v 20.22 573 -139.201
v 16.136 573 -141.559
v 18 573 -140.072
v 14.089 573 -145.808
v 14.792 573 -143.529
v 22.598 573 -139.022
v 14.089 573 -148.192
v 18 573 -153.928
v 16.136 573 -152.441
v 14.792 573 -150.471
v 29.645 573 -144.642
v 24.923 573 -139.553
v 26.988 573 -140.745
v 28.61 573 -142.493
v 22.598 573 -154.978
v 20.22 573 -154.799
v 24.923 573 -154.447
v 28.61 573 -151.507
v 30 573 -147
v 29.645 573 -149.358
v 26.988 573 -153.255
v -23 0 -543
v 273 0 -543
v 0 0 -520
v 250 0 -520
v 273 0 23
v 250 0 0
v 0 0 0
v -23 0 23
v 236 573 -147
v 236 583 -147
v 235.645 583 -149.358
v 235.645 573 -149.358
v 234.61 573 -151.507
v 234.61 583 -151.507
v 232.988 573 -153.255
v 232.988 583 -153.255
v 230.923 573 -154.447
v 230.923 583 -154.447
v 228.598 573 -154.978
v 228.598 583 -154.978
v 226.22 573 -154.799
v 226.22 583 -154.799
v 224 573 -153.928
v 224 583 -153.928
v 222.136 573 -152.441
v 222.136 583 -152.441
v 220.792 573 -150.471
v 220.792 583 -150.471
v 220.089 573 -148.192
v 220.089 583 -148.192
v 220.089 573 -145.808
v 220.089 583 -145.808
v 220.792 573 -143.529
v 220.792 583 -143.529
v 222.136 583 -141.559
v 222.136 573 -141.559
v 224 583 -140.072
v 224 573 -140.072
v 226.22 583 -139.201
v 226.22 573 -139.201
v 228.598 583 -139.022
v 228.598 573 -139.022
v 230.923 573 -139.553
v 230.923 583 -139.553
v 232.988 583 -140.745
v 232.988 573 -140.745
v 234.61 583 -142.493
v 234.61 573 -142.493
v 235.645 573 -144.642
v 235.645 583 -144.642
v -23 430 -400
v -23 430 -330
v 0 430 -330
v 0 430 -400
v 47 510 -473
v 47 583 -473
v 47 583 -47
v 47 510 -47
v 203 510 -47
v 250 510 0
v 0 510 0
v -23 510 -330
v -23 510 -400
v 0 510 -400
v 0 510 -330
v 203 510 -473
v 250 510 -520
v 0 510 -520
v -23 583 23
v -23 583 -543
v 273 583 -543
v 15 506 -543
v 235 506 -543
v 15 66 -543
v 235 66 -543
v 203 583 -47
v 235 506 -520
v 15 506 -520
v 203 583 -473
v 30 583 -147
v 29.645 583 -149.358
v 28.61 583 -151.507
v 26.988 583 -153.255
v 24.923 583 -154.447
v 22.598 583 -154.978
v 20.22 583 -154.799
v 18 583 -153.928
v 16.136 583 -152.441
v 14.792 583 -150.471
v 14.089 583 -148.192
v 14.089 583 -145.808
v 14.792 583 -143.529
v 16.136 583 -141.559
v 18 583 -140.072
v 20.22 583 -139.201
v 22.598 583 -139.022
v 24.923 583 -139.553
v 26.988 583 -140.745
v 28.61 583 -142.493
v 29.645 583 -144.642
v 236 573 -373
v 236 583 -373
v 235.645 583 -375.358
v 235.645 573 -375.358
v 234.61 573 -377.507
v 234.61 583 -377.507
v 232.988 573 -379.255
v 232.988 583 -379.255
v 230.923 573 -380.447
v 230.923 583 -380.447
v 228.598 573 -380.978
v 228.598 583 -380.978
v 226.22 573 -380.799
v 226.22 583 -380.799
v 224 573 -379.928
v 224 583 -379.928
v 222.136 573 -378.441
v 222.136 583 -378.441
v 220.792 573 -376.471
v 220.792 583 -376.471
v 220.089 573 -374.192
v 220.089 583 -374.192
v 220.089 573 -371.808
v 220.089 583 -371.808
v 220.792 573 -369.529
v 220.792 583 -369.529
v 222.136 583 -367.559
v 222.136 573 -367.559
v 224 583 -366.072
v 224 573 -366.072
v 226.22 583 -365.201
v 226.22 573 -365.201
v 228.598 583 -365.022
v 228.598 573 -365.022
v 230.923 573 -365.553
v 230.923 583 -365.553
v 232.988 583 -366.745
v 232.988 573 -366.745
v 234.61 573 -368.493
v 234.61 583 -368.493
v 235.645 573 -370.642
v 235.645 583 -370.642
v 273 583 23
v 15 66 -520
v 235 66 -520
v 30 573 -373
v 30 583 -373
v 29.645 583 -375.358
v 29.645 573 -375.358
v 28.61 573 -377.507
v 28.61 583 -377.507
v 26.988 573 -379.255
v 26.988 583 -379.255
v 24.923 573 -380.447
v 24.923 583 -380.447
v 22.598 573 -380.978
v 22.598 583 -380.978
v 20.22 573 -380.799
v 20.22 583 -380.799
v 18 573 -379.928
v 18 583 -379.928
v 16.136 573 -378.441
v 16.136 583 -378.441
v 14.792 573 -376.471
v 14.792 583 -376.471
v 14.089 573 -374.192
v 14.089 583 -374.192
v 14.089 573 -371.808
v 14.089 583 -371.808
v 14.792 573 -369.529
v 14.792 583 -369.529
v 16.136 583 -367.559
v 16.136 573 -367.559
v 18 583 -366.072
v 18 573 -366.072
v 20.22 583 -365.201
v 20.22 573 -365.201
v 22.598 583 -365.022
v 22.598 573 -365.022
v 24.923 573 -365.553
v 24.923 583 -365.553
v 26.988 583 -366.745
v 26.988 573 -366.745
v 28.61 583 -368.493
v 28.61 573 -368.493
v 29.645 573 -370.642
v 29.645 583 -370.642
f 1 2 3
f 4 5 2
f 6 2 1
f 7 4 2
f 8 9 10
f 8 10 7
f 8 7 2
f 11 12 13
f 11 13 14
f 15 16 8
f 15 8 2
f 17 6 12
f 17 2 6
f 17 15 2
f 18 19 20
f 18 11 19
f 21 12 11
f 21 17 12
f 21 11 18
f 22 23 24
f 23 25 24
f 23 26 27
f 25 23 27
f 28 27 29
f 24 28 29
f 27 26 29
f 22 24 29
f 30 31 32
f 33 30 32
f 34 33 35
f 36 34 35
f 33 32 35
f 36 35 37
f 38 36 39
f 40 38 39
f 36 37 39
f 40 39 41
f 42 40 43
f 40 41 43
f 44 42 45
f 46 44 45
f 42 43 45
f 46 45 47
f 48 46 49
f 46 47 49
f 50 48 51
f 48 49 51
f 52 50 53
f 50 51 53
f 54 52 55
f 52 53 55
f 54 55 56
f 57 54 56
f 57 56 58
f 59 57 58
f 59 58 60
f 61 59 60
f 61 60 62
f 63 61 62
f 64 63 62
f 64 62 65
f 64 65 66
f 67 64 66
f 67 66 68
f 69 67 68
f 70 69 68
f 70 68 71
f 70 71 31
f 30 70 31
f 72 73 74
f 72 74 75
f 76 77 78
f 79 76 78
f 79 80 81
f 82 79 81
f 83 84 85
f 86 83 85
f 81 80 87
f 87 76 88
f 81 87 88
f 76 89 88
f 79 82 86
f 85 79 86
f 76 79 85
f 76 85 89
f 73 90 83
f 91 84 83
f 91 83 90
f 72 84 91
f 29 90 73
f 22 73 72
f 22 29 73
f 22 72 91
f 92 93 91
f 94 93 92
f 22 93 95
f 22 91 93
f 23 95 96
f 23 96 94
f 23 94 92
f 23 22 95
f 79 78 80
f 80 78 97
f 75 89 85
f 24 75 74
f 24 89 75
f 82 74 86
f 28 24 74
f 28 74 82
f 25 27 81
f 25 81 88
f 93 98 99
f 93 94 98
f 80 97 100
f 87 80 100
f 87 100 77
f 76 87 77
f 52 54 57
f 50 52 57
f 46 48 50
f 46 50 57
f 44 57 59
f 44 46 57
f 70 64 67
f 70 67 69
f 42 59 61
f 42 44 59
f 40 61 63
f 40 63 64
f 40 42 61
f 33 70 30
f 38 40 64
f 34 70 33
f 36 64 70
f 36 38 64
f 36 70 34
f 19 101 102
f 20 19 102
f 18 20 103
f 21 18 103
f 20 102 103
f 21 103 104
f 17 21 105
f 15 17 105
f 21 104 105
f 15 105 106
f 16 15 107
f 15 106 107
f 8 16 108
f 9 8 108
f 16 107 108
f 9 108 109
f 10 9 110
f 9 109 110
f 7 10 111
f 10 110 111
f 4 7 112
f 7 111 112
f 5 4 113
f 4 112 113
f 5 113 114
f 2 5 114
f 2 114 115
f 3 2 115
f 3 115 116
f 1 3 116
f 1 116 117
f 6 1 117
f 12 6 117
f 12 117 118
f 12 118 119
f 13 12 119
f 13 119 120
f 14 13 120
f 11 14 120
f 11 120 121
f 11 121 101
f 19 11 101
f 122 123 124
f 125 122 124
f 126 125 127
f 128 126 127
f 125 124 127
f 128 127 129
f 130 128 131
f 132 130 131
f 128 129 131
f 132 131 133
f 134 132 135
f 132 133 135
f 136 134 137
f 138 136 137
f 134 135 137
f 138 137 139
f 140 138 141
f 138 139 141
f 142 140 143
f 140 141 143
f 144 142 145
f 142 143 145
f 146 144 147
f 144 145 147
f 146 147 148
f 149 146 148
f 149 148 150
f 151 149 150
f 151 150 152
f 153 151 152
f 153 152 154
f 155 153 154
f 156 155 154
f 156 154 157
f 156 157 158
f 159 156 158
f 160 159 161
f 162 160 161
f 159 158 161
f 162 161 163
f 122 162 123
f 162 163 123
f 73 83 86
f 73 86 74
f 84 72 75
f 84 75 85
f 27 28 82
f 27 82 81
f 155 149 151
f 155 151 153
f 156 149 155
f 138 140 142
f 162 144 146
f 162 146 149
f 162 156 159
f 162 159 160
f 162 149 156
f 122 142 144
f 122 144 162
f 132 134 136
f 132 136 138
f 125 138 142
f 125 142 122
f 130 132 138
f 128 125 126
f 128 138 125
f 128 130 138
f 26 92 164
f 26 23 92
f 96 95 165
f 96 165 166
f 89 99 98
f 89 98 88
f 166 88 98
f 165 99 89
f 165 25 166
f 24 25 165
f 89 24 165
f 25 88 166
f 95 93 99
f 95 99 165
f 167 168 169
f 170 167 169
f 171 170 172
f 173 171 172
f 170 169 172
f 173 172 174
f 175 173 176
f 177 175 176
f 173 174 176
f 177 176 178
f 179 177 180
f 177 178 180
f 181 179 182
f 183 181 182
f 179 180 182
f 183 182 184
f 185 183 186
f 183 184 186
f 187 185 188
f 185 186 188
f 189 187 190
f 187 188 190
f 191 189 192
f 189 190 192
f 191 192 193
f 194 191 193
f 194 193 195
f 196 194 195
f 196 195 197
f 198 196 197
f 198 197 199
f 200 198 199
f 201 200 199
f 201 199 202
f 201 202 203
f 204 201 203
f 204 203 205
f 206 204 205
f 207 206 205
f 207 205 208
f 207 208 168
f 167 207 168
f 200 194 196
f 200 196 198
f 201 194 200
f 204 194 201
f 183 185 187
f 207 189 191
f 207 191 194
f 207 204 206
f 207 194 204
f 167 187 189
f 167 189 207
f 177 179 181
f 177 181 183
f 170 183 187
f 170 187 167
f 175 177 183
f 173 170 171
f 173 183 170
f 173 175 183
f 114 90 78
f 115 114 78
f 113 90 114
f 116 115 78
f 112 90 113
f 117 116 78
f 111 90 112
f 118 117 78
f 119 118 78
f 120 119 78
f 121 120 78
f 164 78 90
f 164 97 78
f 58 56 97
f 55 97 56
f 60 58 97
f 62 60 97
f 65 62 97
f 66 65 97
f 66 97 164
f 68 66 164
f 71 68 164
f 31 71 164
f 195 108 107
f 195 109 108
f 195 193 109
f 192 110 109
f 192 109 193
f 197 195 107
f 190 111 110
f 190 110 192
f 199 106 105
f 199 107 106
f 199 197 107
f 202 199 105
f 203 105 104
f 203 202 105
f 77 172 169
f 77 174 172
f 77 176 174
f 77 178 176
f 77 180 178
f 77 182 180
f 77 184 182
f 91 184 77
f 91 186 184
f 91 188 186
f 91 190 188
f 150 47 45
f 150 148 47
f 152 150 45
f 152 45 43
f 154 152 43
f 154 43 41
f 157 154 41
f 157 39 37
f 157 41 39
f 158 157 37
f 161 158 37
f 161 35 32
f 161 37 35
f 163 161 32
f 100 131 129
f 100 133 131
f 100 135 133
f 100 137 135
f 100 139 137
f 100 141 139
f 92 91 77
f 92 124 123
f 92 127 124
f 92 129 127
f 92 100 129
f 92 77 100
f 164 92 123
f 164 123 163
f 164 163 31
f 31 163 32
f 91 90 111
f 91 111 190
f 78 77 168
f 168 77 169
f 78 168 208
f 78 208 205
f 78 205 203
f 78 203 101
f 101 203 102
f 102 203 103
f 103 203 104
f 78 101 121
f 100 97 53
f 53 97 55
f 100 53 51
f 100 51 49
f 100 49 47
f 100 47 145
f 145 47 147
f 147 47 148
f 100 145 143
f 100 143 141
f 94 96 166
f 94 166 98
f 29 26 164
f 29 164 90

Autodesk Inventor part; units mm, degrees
ref_plane "YZ Plane" through (0, 0, 0) normal (1, 0, 0) x (0, 1, 0)
ref_plane "XZ Plane" through (0, 0, 0) normal (0, 1, 0) x (-1, 0, 0)
ref_plane "XY Plane" through (0, 0, 0) normal (0, 0, 1) x (1, 0, 0)
sketch "Sketch1" plane through (0, 0, 0) normal (0, 1, 0) x (-1, 0, 0)
  line L0 (0, 0) -> (-250, 0)
  line L1 (-250, 0) -> (-250, -520)
  line L2 (-250, -520) -> (0, -520)
  line L3 (0, -520) -> (0, 0)
  line L4 (23, -543) -> (-273, -543)
  line L5 (-273, -543) -> (-273, 23)
  line L6 (-273, 23) -> (23, 23)
  line L7 (23, 23) -> (23, -543)
  dimension "d0" = 250
  dimension "d1" = 520
  dimension "d2" = 23
extrude "Extrusion1" add sketch "Sketch1" along normal blind 583
sketch "Sketch2" plane through (273, 0, -543) normal (0, 0, -1) x (-1, 0, 0)
  line L0 (38, 506) -> (258, 506)
  line L1 (258, 506) -> (258, 66)
  line L2 (258, 66) -> (38, 66)
  line L3 (38, 66) -> (38, 506)
  line L4 (0, 583) -> (296, 583) projected
  line L5 (296, 0) -> (296, 583) projected
  point P0 (273, 0)
  dimension "d5" = 220
  dimension "d6" = 440
  dimension "d7" = 77
  dimension "d8" = 38
extrude "Extrusion2" cut sketch "Sketch2" against normal up to surface (23 mm away)
sketch "Sketch3" plane through (-23, 0, -543) normal (-1, 0, 0) x (0, 0, 1)
  line L0 (143, 510) -> (213, 510)
  line L1 (213, 510) -> (213, 430)
  line L2 (213, 430) -> (143, 430)
  line L3 (143, 430) -> (143, 510)
  line L4 (566, 0) -> (0, 0) projected
  line L5 (0, 0) -> (0, 583) projected
  point P0 (543, 0)
  dimension "d11" = 70
  dimension "d12" = 80
  dimension "d13" = 430
  dimension "d14" = 143
extrude "Extrusion3" cut sketch "Sketch3" against normal up to surface (23 mm away)
sketch "Sketch5" plane through (0, 583, 0) normal (0, 1, 0) x (1, 0, 0)
  line L0 (250, 0) -> (250, 520) projected
  line L1 (250, 520) -> (0, 520) projected
  line L2 (250, 0) -> (0, 0)
  line L3 (0, 0) -> (0, 520)
  line L4 (0, 520) -> (250, 520)
  line L5 (250, 520) -> (250, 0)
  line L6 (47, 47) -> (203, 47)
  line L7 (203, 47) -> (203, 473)
  line L8 (203, 473) -> (47, 473)
  line L9 (47, 473) -> (47, 47)
  dimension "d17" = 47
extrude "Extrusion4" add sketch "Sketch5" against normal up to surface (73 mm away)
sketch "Sketch6" plane through (0, 583, 0) normal (0, 1, 0) x (1, 0, 0)
  circle A0 centre (228, 373) radius 8
  line L0 (273, 543) -> (-23, 543) projected
  line L1 (273, -23) -> (273, 543) projected
  circle A1 centre (228, 147) radius 8
  line L2 (-23, -23) -> (273, -23) projected
  line L3 (125, -23) -> (125, 543) construction
  circle A2 centre (22, 373) radius 8
  circle A3 centre (22, 147) radius 8
  point P0 (0, 0)
  dimension "d20" = 16
  dimension "d21" = 170
  dimension "d22" = 45
  dimension "d23" = 16
  dimension "d24" = 170
  dimension "d25" = 45
extrude "Extrusion5" cut sketch "Sketch6" against normal blind 10
properties part number "Riight Leg" material "Iron, Cast"
